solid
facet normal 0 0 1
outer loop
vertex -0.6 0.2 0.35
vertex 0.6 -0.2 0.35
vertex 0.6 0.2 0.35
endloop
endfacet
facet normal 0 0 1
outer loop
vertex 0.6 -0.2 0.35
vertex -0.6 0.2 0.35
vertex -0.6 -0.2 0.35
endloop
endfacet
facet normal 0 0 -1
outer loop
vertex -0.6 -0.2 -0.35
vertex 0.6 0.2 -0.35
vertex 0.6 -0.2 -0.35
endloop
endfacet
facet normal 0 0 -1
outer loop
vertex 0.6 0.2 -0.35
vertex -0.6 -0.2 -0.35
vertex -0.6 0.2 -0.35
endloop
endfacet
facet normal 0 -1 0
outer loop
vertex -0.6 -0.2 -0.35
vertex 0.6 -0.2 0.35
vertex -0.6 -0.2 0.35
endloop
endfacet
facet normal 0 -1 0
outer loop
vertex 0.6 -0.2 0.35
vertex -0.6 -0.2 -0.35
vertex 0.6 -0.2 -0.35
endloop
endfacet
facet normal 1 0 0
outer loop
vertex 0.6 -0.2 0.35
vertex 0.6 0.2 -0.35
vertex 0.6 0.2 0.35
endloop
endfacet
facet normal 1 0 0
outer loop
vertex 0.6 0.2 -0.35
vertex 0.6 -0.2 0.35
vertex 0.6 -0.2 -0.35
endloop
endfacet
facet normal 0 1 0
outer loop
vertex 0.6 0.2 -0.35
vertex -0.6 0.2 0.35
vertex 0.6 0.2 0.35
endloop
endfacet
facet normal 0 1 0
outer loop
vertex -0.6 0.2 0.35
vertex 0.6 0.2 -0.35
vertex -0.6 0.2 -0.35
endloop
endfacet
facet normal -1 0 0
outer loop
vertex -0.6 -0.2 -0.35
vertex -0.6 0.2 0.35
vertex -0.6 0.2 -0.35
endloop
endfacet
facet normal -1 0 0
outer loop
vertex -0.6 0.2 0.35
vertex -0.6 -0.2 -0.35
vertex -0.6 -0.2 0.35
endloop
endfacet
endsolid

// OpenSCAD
size_per = 1/100;

govde(en=120*size_per, boy=70*size_per, gen=40*size_per);

module govde(en=120*size_per, boy=70*size_per, gen=40*size_per, $fn=100){
    cube([en,gen, boy], center=true);
}
